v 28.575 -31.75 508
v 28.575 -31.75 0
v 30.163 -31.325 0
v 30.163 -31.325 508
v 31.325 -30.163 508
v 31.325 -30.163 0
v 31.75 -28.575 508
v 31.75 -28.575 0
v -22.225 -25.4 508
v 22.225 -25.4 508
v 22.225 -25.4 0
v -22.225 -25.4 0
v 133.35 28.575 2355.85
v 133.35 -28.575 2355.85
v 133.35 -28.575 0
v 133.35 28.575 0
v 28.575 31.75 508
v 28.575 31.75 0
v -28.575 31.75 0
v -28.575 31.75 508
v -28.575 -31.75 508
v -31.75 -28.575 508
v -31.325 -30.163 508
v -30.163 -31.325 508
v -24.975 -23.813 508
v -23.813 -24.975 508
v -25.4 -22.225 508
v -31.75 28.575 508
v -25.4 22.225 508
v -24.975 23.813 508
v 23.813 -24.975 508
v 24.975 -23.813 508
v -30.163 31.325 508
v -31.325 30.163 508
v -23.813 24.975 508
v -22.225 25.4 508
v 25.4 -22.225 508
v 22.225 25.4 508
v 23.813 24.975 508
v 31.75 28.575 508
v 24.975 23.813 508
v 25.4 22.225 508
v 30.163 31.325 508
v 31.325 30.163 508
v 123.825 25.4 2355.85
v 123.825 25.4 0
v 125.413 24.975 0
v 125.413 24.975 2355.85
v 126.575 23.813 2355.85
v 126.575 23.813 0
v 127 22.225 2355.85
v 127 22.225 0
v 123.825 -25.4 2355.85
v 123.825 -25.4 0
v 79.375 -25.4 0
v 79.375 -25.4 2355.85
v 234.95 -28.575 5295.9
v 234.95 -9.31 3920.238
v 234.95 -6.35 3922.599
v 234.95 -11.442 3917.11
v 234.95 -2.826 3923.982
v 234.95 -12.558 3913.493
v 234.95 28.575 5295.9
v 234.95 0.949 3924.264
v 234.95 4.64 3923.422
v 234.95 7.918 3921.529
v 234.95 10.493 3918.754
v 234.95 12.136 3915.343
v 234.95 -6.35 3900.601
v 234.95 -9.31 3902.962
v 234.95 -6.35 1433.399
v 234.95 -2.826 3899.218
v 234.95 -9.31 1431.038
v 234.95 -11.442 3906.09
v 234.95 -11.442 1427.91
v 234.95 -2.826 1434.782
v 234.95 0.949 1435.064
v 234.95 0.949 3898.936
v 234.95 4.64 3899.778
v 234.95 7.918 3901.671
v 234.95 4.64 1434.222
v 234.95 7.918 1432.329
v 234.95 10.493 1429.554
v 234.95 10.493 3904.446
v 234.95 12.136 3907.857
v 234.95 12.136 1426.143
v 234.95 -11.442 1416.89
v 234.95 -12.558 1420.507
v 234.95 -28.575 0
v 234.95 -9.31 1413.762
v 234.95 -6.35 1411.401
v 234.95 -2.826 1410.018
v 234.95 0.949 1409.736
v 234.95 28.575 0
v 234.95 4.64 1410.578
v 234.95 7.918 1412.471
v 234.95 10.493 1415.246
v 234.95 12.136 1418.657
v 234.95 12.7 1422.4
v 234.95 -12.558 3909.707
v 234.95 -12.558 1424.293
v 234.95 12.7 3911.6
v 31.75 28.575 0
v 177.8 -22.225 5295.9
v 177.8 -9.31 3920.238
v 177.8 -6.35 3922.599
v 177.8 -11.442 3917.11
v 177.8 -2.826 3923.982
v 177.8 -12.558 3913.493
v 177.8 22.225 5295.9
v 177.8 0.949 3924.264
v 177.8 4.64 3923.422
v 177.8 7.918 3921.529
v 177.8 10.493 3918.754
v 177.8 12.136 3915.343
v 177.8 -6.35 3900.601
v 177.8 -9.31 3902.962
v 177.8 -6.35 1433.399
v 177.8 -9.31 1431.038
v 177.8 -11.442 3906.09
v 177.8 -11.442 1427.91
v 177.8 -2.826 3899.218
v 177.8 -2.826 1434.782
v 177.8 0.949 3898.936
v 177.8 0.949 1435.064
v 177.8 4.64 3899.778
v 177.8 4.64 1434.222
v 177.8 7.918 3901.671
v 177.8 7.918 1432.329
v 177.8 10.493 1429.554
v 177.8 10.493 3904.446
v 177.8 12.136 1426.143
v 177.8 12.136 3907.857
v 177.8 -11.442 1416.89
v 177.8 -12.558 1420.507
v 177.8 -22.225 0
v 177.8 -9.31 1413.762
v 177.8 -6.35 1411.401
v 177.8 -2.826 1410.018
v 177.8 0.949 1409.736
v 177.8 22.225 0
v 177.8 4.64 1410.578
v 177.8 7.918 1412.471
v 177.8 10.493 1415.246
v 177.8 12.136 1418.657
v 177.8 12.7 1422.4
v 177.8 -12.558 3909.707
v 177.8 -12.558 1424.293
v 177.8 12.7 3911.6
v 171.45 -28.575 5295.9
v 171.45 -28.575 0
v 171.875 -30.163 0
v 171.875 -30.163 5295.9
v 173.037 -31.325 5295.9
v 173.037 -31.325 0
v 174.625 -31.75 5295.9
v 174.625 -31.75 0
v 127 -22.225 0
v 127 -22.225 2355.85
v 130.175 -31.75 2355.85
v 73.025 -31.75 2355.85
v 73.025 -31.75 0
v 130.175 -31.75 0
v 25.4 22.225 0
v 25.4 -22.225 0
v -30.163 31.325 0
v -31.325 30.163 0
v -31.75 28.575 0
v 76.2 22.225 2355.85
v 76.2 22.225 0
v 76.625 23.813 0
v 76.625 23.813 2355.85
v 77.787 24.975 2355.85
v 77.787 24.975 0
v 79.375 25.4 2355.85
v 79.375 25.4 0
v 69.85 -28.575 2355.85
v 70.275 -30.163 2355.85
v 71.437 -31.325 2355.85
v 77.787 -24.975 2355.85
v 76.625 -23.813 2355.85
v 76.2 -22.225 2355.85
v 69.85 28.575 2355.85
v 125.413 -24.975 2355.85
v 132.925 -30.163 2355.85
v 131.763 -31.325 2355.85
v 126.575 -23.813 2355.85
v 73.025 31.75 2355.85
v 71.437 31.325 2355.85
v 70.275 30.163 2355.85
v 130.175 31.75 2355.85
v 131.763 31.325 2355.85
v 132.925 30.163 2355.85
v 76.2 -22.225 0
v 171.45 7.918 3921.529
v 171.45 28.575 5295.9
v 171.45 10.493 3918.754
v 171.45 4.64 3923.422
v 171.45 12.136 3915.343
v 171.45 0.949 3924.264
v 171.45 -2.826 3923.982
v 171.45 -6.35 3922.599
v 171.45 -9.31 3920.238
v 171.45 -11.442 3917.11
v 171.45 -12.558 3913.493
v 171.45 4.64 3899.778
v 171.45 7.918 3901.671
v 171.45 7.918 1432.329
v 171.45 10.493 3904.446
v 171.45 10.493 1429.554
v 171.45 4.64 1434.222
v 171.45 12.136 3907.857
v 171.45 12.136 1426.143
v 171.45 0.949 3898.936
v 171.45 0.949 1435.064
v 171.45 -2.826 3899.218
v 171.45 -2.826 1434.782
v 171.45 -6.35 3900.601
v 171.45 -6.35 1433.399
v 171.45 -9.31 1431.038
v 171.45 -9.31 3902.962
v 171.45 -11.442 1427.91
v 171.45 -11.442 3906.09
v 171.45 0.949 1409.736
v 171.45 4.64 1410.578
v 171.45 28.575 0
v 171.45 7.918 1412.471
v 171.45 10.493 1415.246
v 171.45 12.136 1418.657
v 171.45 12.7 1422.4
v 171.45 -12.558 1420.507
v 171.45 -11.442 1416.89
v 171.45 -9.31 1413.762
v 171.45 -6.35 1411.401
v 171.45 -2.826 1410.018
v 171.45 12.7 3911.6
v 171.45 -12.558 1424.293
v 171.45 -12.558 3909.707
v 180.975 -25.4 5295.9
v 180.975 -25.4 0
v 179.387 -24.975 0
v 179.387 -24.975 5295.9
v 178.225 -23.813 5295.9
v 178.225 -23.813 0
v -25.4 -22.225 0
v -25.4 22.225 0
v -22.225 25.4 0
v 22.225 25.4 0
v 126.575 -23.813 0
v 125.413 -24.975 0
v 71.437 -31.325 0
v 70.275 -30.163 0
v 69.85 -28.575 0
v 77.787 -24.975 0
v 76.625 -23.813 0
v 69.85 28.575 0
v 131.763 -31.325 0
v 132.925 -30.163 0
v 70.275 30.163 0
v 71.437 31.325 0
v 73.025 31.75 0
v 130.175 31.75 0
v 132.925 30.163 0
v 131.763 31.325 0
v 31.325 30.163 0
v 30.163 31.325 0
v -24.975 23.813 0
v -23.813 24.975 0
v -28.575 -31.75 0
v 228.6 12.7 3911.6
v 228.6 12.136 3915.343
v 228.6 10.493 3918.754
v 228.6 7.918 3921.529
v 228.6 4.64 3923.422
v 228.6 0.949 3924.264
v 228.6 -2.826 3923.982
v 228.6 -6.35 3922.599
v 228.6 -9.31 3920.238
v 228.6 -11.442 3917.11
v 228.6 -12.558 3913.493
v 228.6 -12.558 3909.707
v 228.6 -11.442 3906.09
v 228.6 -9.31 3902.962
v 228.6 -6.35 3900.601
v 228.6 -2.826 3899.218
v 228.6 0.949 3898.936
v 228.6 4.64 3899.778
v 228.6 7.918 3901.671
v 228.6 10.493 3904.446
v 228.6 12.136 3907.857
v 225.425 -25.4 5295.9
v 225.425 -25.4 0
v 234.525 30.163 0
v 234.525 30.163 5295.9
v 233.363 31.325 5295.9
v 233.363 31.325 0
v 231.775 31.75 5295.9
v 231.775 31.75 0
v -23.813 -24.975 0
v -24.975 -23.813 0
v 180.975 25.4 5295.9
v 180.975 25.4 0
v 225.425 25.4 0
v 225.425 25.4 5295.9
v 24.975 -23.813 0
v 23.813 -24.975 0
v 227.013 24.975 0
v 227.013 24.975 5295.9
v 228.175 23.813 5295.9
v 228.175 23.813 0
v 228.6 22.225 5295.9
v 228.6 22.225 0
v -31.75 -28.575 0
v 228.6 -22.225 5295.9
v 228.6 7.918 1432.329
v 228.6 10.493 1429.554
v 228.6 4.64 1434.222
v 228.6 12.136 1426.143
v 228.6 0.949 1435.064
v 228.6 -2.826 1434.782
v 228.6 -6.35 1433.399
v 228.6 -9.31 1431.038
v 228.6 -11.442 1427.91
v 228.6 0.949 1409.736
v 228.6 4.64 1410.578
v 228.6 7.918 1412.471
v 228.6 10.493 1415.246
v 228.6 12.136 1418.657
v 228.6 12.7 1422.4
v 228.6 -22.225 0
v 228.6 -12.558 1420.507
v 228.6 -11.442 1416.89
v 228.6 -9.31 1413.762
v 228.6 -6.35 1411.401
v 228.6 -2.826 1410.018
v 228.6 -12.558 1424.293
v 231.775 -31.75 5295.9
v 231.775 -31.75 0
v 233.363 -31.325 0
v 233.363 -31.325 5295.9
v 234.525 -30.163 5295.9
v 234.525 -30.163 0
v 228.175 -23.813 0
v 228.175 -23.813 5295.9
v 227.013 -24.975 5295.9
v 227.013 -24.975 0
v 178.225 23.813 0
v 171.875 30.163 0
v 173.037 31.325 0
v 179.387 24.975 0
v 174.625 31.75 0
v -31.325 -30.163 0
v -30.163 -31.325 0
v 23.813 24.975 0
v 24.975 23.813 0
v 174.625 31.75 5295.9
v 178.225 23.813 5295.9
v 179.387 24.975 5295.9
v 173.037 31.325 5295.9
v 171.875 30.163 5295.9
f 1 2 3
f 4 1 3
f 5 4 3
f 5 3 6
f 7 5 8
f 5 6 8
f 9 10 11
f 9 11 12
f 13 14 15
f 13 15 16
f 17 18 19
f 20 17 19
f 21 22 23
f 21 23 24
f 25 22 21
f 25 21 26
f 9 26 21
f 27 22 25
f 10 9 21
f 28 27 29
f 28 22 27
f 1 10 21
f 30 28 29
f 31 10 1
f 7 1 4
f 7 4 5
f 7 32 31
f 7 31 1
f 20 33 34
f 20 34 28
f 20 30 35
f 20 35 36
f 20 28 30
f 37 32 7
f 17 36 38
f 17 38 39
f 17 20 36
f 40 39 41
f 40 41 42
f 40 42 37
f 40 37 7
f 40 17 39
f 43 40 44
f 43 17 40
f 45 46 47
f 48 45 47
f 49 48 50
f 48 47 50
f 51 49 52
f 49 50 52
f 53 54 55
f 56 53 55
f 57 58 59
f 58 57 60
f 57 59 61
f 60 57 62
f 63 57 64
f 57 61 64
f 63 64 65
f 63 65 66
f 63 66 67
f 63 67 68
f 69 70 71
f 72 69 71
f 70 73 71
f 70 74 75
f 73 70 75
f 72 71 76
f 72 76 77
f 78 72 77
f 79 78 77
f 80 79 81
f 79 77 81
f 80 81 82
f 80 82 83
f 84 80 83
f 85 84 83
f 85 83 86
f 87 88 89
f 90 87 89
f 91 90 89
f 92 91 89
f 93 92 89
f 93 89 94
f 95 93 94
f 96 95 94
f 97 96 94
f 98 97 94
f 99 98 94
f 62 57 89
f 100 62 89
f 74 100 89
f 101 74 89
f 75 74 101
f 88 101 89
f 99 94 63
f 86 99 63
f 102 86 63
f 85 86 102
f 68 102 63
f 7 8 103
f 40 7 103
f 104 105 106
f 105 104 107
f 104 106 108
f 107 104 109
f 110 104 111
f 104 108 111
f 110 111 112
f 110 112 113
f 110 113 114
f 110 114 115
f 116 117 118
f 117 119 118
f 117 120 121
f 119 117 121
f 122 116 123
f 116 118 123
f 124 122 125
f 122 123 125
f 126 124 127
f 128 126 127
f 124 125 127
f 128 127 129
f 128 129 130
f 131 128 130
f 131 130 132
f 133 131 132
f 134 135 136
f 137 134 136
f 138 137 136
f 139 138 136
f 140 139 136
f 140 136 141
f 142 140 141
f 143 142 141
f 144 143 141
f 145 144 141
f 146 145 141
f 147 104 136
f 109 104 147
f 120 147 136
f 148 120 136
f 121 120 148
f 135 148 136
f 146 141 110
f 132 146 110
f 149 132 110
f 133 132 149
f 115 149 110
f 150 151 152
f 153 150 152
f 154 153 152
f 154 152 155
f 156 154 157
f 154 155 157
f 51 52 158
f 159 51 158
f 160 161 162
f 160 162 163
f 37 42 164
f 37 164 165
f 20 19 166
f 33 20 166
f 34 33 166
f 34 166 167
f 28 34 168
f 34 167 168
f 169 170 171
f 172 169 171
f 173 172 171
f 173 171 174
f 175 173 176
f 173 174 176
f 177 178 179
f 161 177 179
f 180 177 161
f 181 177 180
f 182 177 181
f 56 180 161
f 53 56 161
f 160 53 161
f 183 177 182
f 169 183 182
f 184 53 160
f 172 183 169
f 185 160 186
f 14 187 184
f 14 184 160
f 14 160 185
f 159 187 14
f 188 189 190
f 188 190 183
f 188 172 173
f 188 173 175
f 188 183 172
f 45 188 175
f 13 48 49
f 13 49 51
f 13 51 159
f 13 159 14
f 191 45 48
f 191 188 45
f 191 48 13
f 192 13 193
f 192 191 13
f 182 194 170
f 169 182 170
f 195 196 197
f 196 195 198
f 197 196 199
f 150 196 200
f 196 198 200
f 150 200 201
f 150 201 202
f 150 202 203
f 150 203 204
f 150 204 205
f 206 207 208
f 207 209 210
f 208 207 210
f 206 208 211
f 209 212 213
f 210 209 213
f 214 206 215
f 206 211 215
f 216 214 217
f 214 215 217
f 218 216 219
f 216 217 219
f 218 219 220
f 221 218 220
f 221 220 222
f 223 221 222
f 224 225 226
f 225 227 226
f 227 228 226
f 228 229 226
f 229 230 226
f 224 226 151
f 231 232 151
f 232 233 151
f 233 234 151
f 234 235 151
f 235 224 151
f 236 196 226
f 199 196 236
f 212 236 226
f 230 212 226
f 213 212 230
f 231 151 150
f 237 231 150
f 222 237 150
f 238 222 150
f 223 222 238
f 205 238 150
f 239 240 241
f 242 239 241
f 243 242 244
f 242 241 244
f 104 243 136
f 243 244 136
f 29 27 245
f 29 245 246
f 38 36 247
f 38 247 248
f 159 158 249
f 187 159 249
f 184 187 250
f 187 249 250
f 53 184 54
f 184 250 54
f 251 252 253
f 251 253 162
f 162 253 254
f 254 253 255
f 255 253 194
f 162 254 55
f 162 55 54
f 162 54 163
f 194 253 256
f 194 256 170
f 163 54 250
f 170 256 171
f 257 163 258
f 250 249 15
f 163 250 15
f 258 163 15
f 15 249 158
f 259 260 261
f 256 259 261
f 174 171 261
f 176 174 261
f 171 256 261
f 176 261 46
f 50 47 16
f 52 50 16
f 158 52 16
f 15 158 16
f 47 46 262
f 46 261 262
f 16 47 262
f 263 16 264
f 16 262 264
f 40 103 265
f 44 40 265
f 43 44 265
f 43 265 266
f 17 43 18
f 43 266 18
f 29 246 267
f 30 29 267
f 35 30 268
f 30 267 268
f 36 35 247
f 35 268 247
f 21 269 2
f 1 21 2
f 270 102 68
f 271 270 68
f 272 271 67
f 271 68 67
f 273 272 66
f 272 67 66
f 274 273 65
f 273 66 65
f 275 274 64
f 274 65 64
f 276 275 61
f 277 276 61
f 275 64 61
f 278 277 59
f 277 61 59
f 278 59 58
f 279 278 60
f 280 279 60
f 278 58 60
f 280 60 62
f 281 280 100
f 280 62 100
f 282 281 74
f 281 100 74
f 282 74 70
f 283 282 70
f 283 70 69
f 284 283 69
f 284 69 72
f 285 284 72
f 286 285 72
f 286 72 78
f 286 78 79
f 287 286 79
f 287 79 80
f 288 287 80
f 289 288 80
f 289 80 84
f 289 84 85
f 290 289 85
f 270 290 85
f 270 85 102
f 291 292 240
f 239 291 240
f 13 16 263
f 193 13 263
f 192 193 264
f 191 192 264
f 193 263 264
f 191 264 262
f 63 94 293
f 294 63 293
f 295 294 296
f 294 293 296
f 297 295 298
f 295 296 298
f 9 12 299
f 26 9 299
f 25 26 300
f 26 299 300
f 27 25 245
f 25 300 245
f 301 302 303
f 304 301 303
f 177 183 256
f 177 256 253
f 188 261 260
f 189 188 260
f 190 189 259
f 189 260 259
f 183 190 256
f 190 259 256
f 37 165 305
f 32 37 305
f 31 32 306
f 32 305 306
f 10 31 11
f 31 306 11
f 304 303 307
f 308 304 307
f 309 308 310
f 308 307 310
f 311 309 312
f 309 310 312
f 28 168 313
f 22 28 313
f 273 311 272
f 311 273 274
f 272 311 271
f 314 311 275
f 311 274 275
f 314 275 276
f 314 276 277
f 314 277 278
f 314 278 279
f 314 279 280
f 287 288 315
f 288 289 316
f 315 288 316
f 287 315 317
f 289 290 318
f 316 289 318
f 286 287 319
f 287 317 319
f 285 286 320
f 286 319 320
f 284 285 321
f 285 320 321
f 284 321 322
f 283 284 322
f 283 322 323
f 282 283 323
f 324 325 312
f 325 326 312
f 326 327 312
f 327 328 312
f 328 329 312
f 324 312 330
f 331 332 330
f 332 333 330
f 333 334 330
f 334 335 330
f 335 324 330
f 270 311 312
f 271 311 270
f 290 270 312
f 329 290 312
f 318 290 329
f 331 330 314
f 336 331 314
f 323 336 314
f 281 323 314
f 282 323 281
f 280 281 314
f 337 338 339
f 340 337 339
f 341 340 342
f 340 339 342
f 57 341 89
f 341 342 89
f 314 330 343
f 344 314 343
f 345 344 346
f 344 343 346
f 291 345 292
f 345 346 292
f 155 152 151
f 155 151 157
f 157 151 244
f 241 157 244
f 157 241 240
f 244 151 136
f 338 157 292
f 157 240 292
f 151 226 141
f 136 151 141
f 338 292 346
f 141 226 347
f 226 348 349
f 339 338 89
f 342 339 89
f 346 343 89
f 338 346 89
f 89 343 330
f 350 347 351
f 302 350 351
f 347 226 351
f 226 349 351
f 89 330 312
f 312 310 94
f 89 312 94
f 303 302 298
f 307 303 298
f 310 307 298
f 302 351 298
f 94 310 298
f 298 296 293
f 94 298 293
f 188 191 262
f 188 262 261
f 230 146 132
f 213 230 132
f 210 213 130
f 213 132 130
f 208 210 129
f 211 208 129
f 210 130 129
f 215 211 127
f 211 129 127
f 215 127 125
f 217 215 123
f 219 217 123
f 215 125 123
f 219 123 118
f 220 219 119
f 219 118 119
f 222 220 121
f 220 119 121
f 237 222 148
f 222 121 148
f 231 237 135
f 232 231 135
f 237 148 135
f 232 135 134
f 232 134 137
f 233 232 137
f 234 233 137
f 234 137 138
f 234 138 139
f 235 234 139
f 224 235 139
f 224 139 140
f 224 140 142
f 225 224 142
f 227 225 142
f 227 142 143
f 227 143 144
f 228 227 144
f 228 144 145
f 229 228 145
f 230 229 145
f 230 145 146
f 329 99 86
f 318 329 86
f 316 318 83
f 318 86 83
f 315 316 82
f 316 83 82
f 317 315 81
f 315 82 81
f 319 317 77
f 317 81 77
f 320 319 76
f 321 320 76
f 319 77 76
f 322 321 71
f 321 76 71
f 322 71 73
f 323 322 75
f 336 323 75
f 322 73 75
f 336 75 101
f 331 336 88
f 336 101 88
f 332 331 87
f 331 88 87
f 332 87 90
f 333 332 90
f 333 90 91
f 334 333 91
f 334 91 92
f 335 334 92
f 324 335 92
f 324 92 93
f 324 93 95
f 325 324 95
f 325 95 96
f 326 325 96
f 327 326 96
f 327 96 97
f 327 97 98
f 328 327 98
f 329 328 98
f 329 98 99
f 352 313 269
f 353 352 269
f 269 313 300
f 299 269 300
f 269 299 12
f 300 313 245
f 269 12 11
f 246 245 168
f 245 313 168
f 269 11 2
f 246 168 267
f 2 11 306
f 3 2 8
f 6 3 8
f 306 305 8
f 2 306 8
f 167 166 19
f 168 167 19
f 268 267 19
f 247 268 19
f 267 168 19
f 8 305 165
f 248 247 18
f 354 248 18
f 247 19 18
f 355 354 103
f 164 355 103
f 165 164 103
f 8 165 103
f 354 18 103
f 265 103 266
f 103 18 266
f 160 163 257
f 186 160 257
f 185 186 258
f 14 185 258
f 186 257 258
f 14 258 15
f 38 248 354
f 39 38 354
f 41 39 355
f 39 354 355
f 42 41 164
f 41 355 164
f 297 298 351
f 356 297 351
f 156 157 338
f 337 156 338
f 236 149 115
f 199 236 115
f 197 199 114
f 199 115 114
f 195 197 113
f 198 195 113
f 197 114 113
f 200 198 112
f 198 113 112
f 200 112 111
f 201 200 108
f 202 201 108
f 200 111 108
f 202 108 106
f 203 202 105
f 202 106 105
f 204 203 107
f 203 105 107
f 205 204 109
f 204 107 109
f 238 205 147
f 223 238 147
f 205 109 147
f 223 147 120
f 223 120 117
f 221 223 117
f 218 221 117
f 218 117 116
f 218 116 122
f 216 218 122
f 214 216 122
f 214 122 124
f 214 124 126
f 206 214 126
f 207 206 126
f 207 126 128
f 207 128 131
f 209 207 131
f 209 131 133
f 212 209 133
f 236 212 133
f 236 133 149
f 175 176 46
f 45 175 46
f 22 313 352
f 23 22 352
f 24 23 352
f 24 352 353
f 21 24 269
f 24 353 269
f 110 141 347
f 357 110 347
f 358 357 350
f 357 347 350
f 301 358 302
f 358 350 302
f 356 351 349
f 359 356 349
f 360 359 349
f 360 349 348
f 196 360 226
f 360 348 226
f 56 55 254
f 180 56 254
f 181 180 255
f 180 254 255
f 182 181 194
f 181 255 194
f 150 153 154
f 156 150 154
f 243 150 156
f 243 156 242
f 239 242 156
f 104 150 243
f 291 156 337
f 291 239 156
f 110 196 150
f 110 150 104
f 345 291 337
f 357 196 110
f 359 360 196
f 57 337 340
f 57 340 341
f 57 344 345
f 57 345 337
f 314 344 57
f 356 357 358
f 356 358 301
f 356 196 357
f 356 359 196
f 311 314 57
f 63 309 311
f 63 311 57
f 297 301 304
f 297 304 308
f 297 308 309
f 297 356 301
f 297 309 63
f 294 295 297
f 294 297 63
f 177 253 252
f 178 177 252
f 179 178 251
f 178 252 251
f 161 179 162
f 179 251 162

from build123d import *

# Parameters (mm, degrees)
F1_DEPTH = 508
F2_DEPTH = 2355.85
F3_DEPTH = 5295.9
F6_R     = 12.7
F7_DEPTH = 266.701


with BuildPart() as f1:
    # F0 (on Top) → F1 (new body)
    with BuildSketch(Plane.XY):
        with BuildLine():
            ThreePointArc((31.75, 28.575), (30.8200640303, 30.8200640303), (28.575, 31.75))
            Line((28.575, 31.75), (-28.575, 31.75))
            ThreePointArc((-28.575, 31.75), (-30.8200640303, 30.8200640303), (-31.75, 28.575))
            Line((-31.75, 28.575), (-31.75, -28.575))
            ThreePointArc((-31.75, -28.575), (-30.8200640303, -30.8200640303), (-28.575, -31.75))
            Line((-28.575, -31.75), (28.575, -31.75))
            ThreePointArc((28.575, -31.75), (30.8200640303, -30.8200640303), (31.75, -28.575))
            Line((31.75, -28.575), (31.75, 28.575))
        make_face()
        with BuildLine():
            Line((-22.225, 25.4), (22.225, 25.4))
            ThreePointArc((22.225, 25.4), (24.4700640303, 24.4700640303), (25.4, 22.225))
            Line((25.4, 22.225), (25.4, -22.225))
            ThreePointArc((25.4, -22.225), (24.4700640303, -24.4700640303), (22.225, -25.4))
            Line((22.225, -25.4), (-22.225, -25.4))
            ThreePointArc((-22.225, -25.4), (-24.4700640303, -24.4700640303), (-25.4, -22.225))
            Line((-25.4, -22.225), (-25.4, 22.225))
            ThreePointArc((-25.4, 22.225), (-24.4700640303, 24.4700640303), (-22.225, 25.4))
        make_face(mode=Mode.SUBTRACT)
    extrude(amount=F1_DEPTH)


with BuildPart() as f2:
    # F0 (on Top) → F2 (new body)
    with BuildSketch(Plane.XY):
        with BuildLine():
            Line((73.025, -31.75), (130.175, -31.75))
            ThreePointArc((130.175, -31.75), (132.4200640303, -30.8200640303), (133.35, -28.575))
            Line((133.35, -28.575), (133.35, 28.575))
            ThreePointArc((133.35, 28.575), (132.4200640303, 30.8200640303), (130.175, 31.75))
            Line((130.175, 31.75), (73.025, 31.75))
            ThreePointArc((73.025, 31.75), (70.7799359697, 30.8200640303), (69.85, 28.575))
            Line((69.85, 28.575), (69.85, -28.575))
            ThreePointArc((69.85, -28.575), (70.7799359697, -30.8200640303), (73.025, -31.75))
        make_face()
        with BuildLine():
            Line((79.375, 25.4), (123.825, 25.4))
            ThreePointArc((123.825, 25.4), (126.0700640303, 24.4700640303), (127, 22.225))
            Line((127, 22.225), (127, -22.225))
            ThreePointArc((127, -22.225), (126.0700640303, -24.4700640303), (123.825, -25.4))
            Line((123.825, -25.4), (79.375, -25.4))
            ThreePointArc((79.375, -25.4), (77.1299359697, -24.4700640303), (76.2, -22.225))
            Line((76.2, -22.225), (76.2, 22.225))
            ThreePointArc((76.2, 22.225), (77.1299359697, 24.4700640303), (79.375, 25.4))
        make_face(mode=Mode.SUBTRACT)
    extrude(amount=F2_DEPTH)


with BuildPart() as f3:
    # F0 (on Top) → F3 (new body)
    with BuildSketch(Plane.XY):
        with BuildLine():
            Line((174.625, -31.75), (231.775, -31.75))
            ThreePointArc((231.775, -31.75), (234.0200640303, -30.8200640303), (234.95, -28.575))
            Line((234.95, -28.575), (234.95, 28.575))
            ThreePointArc((234.95, 28.575), (234.0200640303, 30.8200640303), (231.775, 31.75))
            Line((231.775, 31.75), (174.625, 31.75))
            ThreePointArc((174.625, 31.75), (172.3799359697, 30.8200640303), (171.45, 28.575))
            Line((171.45, 28.575), (171.45, -28.575))
            ThreePointArc((171.45, -28.575), (172.3799359697, -30.8200640303), (174.625, -31.75))
        make_face()
        with BuildLine():
            Line((180.975, 25.4), (225.425, 25.4))
            ThreePointArc((225.425, 25.4), (227.6700640303, 24.4700640303), (228.6, 22.225))
            Line((228.6, 22.225), (228.6, -22.225))
            ThreePointArc((228.6, -22.225), (227.6700640303, -24.4700640303), (225.425, -25.4))
            Line((225.425, -25.4), (180.975, -25.4))
            ThreePointArc((180.975, -25.4), (178.7299359697, -24.4700640303), (177.8, -22.225))
            Line((177.8, -22.225), (177.8, 22.225))
            ThreePointArc((177.8, 22.225), (178.7299359697, 24.4700640303), (180.975, 25.4))
        make_face(mode=Mode.SUBTRACT)
    extrude(amount=F3_DEPTH)

    # F6 (on face) → F7 (cut, through all)
    with BuildSketch(Plane.YZ.offset(234.95)):
        with Locations((0, 3911.6)):
            Circle(F6_R)
        with Locations((0, 1422.4)):
            Circle(F6_R)
    extrude(amount=-F7_DEPTH, mode=Mode.SUBTRACT)


solid = Compound([f1.part, f2.part, f3.part])
